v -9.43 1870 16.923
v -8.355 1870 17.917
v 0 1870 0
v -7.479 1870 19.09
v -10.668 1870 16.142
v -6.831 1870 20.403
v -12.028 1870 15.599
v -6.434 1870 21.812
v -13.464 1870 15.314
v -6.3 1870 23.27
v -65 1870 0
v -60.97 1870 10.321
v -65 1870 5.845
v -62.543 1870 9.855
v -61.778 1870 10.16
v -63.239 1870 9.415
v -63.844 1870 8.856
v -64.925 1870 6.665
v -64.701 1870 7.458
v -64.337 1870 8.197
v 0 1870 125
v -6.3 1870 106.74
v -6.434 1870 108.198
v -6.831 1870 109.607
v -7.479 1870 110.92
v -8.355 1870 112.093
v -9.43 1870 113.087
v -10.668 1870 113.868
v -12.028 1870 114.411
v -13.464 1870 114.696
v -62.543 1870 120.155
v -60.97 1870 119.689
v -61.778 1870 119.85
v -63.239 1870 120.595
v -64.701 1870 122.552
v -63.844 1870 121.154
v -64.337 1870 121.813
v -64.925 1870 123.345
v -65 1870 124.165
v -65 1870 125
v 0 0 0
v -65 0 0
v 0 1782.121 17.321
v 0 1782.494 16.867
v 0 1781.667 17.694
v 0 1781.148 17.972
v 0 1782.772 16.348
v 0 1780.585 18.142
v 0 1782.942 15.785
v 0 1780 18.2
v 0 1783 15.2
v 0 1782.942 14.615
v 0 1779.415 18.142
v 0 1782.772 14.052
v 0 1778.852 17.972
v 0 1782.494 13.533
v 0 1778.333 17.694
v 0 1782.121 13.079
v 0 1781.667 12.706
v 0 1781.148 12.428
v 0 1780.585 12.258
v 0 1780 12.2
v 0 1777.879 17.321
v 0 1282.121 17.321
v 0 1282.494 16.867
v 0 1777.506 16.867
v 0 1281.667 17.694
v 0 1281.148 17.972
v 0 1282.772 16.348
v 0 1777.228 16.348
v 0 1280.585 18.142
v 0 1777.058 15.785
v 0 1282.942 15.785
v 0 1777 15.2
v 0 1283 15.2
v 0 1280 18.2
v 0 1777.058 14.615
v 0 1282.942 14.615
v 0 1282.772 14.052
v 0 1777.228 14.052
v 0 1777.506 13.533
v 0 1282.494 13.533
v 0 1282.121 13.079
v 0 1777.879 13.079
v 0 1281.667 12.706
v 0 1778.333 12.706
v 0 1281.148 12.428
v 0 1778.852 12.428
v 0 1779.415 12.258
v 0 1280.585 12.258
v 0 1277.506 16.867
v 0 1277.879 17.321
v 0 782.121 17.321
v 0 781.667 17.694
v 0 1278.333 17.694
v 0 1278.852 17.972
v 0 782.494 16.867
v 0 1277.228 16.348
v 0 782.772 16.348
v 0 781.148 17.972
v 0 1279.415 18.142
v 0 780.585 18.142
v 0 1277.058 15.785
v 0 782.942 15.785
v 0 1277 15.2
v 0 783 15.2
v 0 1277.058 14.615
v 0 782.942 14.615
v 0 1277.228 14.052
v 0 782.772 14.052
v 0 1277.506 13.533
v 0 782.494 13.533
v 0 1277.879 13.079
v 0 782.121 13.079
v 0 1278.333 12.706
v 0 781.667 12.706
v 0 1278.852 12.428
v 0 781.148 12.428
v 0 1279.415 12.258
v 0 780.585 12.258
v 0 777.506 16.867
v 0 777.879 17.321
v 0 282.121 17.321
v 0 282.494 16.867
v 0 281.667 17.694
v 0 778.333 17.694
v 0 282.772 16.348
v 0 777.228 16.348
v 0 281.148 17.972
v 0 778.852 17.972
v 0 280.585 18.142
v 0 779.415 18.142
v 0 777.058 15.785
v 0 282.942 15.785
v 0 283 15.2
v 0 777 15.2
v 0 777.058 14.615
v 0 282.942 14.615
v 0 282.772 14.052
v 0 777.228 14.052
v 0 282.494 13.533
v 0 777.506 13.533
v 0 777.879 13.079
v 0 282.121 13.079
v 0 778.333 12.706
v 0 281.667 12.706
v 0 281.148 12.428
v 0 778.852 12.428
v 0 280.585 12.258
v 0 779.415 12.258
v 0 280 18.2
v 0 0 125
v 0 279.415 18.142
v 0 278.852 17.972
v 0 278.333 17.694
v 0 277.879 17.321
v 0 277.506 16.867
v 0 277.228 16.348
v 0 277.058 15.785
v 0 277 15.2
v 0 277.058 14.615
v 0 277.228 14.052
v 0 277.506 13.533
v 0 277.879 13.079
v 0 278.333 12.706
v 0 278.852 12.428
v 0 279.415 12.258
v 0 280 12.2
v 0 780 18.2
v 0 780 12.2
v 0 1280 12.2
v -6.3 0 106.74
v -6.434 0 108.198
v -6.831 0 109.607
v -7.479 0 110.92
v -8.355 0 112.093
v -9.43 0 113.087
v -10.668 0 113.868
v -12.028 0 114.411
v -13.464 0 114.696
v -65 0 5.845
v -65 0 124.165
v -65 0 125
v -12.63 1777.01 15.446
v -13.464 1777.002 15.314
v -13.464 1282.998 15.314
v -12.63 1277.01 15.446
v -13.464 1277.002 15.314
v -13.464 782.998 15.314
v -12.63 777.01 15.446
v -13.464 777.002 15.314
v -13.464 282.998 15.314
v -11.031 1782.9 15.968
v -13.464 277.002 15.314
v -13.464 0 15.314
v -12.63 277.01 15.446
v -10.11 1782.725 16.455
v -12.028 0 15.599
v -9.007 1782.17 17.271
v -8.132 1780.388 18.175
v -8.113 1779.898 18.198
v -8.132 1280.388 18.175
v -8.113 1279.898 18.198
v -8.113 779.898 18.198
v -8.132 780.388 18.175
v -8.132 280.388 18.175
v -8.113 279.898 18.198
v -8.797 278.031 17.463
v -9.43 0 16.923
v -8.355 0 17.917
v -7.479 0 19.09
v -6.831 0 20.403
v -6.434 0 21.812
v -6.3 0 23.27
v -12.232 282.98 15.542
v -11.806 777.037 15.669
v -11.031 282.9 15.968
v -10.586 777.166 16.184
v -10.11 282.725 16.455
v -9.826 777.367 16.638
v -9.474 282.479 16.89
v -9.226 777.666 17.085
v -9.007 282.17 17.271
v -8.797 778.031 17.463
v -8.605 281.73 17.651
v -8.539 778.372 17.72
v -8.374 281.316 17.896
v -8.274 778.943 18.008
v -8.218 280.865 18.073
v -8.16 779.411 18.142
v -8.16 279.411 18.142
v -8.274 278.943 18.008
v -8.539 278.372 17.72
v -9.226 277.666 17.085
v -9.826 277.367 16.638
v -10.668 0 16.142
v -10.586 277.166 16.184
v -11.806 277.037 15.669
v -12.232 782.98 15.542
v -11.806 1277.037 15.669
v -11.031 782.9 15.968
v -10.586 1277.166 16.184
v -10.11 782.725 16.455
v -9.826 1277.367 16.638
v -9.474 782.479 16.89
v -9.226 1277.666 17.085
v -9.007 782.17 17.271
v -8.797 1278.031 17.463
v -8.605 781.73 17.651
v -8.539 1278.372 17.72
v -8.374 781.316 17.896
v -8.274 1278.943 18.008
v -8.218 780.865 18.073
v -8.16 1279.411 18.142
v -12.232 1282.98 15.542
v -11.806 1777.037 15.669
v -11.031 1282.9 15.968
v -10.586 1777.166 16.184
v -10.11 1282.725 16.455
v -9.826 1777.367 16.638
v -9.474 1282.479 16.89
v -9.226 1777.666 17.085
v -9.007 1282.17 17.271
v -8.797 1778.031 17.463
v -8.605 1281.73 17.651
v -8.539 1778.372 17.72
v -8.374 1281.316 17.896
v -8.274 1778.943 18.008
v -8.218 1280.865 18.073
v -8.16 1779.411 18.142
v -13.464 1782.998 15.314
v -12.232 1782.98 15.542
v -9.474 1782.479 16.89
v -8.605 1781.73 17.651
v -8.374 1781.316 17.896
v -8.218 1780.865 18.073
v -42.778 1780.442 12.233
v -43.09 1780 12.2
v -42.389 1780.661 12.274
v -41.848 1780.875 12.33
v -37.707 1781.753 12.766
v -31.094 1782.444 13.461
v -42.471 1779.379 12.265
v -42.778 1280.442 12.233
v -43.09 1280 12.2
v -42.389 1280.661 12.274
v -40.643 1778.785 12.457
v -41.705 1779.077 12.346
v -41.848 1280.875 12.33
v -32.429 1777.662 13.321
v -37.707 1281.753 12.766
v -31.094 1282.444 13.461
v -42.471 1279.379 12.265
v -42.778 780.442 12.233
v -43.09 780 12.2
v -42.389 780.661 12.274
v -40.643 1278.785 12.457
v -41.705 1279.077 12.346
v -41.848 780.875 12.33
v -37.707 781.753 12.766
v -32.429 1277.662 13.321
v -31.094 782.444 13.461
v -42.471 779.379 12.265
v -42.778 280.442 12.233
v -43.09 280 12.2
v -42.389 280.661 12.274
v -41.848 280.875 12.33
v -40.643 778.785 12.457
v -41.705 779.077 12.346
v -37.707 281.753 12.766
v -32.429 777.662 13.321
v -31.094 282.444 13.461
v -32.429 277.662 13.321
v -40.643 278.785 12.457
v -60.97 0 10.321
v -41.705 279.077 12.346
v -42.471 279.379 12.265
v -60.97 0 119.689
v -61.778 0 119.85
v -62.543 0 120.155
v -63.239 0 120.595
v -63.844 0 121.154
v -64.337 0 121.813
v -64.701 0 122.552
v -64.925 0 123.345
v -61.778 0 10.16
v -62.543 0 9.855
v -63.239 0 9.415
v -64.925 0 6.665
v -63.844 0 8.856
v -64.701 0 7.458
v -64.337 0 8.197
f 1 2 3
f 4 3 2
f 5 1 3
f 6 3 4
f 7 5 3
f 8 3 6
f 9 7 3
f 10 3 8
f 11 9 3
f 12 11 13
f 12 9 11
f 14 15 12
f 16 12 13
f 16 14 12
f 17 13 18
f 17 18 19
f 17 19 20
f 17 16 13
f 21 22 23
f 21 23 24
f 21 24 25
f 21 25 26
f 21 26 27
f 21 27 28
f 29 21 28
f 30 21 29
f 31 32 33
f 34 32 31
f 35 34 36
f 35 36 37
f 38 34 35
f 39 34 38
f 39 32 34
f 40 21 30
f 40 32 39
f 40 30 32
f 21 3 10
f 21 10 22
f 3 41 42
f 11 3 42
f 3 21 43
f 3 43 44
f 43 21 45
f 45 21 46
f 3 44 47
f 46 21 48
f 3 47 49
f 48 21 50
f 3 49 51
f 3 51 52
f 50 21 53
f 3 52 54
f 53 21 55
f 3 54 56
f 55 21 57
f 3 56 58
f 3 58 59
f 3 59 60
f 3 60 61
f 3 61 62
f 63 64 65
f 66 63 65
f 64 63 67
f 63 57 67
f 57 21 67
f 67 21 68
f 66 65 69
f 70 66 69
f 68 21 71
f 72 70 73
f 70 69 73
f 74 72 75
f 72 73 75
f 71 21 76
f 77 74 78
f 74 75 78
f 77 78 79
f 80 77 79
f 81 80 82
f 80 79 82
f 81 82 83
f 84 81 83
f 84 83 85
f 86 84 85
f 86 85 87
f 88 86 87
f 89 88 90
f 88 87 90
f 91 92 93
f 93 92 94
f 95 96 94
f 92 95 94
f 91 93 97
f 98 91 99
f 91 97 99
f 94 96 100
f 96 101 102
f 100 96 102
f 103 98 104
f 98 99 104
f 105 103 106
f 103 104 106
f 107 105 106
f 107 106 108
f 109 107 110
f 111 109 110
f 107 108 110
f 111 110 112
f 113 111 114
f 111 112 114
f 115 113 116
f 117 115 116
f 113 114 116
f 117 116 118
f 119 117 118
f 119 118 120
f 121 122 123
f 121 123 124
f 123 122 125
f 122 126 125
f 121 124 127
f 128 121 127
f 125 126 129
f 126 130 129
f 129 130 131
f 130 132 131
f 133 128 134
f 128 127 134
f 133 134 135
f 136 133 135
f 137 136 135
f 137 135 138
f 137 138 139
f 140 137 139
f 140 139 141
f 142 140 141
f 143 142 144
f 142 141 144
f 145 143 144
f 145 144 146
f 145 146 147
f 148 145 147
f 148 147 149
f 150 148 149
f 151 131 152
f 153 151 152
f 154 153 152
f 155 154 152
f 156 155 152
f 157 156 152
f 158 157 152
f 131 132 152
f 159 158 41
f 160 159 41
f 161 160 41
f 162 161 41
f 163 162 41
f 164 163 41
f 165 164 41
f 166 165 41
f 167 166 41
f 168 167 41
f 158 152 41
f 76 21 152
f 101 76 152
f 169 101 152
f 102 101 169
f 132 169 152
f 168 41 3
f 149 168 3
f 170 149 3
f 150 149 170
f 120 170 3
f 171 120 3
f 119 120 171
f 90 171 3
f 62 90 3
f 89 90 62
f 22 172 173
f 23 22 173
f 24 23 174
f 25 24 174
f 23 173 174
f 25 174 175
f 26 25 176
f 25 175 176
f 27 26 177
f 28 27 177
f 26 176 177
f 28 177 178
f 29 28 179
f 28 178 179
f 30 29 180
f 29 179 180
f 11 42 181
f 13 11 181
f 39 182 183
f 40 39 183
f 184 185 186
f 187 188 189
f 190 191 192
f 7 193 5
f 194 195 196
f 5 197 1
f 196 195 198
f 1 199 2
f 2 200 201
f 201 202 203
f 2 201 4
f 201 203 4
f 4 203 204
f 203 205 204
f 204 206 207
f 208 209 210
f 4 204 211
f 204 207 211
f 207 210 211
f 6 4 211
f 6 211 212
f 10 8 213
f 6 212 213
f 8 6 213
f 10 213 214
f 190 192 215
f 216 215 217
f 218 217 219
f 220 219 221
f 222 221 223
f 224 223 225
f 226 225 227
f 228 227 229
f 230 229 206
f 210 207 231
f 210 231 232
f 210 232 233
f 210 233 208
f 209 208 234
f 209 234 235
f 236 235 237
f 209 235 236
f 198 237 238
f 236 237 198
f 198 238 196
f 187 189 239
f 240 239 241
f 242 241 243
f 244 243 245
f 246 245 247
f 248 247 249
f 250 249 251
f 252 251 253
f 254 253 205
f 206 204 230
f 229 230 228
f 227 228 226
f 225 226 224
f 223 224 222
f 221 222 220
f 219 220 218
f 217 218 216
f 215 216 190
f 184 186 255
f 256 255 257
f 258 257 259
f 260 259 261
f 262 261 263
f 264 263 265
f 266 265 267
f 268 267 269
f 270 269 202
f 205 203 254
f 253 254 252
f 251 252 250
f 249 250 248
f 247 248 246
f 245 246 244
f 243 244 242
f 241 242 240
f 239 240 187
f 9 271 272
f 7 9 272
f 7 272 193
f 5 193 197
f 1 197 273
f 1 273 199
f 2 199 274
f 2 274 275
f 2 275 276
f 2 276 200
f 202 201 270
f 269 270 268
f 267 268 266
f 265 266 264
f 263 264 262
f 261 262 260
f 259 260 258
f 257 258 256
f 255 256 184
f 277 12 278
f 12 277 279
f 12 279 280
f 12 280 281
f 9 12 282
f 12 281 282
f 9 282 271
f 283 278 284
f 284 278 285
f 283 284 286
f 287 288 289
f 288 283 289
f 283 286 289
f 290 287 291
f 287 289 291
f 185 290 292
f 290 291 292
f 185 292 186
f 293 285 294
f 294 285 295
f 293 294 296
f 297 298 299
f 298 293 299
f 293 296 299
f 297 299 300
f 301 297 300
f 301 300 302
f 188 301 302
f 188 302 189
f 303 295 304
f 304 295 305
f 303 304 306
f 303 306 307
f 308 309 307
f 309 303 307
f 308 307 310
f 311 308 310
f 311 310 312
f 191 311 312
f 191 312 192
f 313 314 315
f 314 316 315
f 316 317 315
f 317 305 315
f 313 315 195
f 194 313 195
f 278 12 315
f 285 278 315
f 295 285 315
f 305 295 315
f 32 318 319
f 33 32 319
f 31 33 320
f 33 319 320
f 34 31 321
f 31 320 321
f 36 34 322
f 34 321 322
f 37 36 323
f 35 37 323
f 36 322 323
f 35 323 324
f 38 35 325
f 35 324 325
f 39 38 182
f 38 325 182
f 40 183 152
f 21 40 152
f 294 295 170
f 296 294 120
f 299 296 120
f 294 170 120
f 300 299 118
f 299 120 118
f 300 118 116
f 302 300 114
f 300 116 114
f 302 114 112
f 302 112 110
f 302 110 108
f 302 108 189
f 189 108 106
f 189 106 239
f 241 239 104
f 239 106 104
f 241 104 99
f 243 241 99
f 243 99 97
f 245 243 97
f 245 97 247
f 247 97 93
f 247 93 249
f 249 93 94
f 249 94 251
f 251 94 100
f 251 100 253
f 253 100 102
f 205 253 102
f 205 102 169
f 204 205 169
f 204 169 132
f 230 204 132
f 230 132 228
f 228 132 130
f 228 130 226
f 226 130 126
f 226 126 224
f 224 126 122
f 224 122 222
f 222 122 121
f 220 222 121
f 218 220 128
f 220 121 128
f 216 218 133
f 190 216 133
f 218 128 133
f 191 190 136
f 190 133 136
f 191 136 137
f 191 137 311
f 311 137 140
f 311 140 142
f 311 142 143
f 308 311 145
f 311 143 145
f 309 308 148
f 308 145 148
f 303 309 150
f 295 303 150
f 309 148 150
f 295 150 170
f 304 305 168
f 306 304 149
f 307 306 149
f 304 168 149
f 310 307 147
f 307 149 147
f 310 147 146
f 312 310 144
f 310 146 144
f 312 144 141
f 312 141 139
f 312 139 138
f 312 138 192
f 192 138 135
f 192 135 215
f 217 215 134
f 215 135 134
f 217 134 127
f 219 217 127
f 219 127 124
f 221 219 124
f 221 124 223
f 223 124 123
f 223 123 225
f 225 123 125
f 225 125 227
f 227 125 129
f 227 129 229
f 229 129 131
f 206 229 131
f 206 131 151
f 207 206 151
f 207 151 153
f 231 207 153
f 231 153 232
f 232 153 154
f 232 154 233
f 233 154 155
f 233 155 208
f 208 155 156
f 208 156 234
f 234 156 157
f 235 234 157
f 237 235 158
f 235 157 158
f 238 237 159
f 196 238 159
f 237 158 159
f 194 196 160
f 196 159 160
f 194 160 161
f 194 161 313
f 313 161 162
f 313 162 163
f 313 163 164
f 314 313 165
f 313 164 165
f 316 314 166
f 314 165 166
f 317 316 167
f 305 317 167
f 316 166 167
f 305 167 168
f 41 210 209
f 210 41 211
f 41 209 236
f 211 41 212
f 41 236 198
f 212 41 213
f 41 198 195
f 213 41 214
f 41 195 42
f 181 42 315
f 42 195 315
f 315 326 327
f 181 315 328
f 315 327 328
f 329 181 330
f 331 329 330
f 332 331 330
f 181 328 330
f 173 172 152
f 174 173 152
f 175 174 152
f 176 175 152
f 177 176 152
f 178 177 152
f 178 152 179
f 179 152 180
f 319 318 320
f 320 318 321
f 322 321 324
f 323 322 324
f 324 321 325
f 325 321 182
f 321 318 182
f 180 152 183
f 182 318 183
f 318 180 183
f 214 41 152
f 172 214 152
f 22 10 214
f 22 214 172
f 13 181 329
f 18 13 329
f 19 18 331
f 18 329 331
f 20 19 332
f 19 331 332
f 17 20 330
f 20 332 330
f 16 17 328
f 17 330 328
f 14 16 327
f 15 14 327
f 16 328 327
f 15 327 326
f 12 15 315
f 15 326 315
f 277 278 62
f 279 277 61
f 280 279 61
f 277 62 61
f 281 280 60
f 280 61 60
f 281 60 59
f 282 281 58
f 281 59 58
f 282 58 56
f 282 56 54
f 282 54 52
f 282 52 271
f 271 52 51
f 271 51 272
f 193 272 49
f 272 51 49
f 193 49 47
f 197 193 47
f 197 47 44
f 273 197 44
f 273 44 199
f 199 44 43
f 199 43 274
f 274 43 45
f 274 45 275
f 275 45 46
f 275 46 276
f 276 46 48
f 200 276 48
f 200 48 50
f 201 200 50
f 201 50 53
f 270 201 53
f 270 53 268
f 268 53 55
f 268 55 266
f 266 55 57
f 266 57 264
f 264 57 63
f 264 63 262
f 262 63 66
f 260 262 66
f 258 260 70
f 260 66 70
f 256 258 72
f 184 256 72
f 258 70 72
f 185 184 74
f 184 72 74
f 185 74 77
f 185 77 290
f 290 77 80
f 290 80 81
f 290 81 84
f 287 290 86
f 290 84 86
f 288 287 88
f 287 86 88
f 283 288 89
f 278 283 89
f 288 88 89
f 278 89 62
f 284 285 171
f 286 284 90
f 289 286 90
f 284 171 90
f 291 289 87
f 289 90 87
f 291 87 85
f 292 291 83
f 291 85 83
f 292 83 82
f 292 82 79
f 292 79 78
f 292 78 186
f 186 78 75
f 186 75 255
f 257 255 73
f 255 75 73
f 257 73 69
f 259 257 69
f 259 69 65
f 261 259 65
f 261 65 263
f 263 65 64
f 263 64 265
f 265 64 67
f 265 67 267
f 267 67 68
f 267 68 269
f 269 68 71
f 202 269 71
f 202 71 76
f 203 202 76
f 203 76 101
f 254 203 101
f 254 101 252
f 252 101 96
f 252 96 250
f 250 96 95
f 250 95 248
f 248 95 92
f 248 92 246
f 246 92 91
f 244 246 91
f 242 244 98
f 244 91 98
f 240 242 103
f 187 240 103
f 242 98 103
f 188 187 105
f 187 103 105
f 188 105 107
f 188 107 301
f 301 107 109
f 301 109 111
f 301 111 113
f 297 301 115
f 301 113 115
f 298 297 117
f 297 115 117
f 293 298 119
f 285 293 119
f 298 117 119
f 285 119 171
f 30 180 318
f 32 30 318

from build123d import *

# Parameters (mm, degrees)
C_CHANNEL_120_X_12_5_DEPTH = 1870
SKETCH16_R                 = 3
CUT_EXTRUDE1_DEPTH         = 1876.299976004


with BuildPart() as part:
    # Sketch1 → C channel 120 X 12(5) (new body)
    with BuildSketch(Plane(origin=(0, 0, 0), x_dir=(-1, 0, 0), z_dir=(0, 1, 0))):
        with BuildLine():
            Line((65, 125), (0, 125))
            Line((0, 125), (0, 0))
            Line((0, 0), (65, 0))
            Line((65, 0), (65, 5.845330836))
            ThreePointArc((65, 5.845330836), (63.844151715, 8.856418565), (60.970378085, 10.320679365))
            Line((60.970378085, 10.320679365), (13.463772294, 15.313824837))
            ThreePointArc((13.463772294, 15.313824837), (8.354841396, 17.916955149), (6.3, 23.27))
            Line((6.3, 23.27), (6.3, 106.74))
            ThreePointArc((6.3, 106.74), (8.354841396, 112.093044851), (13.463772294, 114.696175163))
            Line((13.463772294, 114.696175163), (60.970378085, 119.689320635))
            ThreePointArc((60.970378085, 119.689320635), (63.844151715, 121.153581435), (65, 124.164669164))
            Line((65, 124.164669164), (65, 125))
        make_face()
    extrude(amount=C_CHANNEL_120_X_12_5_DEPTH)

    # Sketch16 → Cut-Extrude1 (cut, through all)
    with BuildSketch(Plane(origin=(0, 0, 0), x_dir=(0, 0, -1), z_dir=(1, 0, 0))):
        with Locations((-15.2, 280)):
            Circle(SKETCH16_R)
        with Locations((-15.2, 780)):
            Circle(SKETCH16_R)
        with Locations((-15.2, 1280)):
            Circle(SKETCH16_R)
        with Locations((-15.2, 1780)):
            Circle(SKETCH16_R)
    extrude(amount=-CUT_EXTRUDE1_DEPTH, mode=Mode.SUBTRACT)


solid = part.part
